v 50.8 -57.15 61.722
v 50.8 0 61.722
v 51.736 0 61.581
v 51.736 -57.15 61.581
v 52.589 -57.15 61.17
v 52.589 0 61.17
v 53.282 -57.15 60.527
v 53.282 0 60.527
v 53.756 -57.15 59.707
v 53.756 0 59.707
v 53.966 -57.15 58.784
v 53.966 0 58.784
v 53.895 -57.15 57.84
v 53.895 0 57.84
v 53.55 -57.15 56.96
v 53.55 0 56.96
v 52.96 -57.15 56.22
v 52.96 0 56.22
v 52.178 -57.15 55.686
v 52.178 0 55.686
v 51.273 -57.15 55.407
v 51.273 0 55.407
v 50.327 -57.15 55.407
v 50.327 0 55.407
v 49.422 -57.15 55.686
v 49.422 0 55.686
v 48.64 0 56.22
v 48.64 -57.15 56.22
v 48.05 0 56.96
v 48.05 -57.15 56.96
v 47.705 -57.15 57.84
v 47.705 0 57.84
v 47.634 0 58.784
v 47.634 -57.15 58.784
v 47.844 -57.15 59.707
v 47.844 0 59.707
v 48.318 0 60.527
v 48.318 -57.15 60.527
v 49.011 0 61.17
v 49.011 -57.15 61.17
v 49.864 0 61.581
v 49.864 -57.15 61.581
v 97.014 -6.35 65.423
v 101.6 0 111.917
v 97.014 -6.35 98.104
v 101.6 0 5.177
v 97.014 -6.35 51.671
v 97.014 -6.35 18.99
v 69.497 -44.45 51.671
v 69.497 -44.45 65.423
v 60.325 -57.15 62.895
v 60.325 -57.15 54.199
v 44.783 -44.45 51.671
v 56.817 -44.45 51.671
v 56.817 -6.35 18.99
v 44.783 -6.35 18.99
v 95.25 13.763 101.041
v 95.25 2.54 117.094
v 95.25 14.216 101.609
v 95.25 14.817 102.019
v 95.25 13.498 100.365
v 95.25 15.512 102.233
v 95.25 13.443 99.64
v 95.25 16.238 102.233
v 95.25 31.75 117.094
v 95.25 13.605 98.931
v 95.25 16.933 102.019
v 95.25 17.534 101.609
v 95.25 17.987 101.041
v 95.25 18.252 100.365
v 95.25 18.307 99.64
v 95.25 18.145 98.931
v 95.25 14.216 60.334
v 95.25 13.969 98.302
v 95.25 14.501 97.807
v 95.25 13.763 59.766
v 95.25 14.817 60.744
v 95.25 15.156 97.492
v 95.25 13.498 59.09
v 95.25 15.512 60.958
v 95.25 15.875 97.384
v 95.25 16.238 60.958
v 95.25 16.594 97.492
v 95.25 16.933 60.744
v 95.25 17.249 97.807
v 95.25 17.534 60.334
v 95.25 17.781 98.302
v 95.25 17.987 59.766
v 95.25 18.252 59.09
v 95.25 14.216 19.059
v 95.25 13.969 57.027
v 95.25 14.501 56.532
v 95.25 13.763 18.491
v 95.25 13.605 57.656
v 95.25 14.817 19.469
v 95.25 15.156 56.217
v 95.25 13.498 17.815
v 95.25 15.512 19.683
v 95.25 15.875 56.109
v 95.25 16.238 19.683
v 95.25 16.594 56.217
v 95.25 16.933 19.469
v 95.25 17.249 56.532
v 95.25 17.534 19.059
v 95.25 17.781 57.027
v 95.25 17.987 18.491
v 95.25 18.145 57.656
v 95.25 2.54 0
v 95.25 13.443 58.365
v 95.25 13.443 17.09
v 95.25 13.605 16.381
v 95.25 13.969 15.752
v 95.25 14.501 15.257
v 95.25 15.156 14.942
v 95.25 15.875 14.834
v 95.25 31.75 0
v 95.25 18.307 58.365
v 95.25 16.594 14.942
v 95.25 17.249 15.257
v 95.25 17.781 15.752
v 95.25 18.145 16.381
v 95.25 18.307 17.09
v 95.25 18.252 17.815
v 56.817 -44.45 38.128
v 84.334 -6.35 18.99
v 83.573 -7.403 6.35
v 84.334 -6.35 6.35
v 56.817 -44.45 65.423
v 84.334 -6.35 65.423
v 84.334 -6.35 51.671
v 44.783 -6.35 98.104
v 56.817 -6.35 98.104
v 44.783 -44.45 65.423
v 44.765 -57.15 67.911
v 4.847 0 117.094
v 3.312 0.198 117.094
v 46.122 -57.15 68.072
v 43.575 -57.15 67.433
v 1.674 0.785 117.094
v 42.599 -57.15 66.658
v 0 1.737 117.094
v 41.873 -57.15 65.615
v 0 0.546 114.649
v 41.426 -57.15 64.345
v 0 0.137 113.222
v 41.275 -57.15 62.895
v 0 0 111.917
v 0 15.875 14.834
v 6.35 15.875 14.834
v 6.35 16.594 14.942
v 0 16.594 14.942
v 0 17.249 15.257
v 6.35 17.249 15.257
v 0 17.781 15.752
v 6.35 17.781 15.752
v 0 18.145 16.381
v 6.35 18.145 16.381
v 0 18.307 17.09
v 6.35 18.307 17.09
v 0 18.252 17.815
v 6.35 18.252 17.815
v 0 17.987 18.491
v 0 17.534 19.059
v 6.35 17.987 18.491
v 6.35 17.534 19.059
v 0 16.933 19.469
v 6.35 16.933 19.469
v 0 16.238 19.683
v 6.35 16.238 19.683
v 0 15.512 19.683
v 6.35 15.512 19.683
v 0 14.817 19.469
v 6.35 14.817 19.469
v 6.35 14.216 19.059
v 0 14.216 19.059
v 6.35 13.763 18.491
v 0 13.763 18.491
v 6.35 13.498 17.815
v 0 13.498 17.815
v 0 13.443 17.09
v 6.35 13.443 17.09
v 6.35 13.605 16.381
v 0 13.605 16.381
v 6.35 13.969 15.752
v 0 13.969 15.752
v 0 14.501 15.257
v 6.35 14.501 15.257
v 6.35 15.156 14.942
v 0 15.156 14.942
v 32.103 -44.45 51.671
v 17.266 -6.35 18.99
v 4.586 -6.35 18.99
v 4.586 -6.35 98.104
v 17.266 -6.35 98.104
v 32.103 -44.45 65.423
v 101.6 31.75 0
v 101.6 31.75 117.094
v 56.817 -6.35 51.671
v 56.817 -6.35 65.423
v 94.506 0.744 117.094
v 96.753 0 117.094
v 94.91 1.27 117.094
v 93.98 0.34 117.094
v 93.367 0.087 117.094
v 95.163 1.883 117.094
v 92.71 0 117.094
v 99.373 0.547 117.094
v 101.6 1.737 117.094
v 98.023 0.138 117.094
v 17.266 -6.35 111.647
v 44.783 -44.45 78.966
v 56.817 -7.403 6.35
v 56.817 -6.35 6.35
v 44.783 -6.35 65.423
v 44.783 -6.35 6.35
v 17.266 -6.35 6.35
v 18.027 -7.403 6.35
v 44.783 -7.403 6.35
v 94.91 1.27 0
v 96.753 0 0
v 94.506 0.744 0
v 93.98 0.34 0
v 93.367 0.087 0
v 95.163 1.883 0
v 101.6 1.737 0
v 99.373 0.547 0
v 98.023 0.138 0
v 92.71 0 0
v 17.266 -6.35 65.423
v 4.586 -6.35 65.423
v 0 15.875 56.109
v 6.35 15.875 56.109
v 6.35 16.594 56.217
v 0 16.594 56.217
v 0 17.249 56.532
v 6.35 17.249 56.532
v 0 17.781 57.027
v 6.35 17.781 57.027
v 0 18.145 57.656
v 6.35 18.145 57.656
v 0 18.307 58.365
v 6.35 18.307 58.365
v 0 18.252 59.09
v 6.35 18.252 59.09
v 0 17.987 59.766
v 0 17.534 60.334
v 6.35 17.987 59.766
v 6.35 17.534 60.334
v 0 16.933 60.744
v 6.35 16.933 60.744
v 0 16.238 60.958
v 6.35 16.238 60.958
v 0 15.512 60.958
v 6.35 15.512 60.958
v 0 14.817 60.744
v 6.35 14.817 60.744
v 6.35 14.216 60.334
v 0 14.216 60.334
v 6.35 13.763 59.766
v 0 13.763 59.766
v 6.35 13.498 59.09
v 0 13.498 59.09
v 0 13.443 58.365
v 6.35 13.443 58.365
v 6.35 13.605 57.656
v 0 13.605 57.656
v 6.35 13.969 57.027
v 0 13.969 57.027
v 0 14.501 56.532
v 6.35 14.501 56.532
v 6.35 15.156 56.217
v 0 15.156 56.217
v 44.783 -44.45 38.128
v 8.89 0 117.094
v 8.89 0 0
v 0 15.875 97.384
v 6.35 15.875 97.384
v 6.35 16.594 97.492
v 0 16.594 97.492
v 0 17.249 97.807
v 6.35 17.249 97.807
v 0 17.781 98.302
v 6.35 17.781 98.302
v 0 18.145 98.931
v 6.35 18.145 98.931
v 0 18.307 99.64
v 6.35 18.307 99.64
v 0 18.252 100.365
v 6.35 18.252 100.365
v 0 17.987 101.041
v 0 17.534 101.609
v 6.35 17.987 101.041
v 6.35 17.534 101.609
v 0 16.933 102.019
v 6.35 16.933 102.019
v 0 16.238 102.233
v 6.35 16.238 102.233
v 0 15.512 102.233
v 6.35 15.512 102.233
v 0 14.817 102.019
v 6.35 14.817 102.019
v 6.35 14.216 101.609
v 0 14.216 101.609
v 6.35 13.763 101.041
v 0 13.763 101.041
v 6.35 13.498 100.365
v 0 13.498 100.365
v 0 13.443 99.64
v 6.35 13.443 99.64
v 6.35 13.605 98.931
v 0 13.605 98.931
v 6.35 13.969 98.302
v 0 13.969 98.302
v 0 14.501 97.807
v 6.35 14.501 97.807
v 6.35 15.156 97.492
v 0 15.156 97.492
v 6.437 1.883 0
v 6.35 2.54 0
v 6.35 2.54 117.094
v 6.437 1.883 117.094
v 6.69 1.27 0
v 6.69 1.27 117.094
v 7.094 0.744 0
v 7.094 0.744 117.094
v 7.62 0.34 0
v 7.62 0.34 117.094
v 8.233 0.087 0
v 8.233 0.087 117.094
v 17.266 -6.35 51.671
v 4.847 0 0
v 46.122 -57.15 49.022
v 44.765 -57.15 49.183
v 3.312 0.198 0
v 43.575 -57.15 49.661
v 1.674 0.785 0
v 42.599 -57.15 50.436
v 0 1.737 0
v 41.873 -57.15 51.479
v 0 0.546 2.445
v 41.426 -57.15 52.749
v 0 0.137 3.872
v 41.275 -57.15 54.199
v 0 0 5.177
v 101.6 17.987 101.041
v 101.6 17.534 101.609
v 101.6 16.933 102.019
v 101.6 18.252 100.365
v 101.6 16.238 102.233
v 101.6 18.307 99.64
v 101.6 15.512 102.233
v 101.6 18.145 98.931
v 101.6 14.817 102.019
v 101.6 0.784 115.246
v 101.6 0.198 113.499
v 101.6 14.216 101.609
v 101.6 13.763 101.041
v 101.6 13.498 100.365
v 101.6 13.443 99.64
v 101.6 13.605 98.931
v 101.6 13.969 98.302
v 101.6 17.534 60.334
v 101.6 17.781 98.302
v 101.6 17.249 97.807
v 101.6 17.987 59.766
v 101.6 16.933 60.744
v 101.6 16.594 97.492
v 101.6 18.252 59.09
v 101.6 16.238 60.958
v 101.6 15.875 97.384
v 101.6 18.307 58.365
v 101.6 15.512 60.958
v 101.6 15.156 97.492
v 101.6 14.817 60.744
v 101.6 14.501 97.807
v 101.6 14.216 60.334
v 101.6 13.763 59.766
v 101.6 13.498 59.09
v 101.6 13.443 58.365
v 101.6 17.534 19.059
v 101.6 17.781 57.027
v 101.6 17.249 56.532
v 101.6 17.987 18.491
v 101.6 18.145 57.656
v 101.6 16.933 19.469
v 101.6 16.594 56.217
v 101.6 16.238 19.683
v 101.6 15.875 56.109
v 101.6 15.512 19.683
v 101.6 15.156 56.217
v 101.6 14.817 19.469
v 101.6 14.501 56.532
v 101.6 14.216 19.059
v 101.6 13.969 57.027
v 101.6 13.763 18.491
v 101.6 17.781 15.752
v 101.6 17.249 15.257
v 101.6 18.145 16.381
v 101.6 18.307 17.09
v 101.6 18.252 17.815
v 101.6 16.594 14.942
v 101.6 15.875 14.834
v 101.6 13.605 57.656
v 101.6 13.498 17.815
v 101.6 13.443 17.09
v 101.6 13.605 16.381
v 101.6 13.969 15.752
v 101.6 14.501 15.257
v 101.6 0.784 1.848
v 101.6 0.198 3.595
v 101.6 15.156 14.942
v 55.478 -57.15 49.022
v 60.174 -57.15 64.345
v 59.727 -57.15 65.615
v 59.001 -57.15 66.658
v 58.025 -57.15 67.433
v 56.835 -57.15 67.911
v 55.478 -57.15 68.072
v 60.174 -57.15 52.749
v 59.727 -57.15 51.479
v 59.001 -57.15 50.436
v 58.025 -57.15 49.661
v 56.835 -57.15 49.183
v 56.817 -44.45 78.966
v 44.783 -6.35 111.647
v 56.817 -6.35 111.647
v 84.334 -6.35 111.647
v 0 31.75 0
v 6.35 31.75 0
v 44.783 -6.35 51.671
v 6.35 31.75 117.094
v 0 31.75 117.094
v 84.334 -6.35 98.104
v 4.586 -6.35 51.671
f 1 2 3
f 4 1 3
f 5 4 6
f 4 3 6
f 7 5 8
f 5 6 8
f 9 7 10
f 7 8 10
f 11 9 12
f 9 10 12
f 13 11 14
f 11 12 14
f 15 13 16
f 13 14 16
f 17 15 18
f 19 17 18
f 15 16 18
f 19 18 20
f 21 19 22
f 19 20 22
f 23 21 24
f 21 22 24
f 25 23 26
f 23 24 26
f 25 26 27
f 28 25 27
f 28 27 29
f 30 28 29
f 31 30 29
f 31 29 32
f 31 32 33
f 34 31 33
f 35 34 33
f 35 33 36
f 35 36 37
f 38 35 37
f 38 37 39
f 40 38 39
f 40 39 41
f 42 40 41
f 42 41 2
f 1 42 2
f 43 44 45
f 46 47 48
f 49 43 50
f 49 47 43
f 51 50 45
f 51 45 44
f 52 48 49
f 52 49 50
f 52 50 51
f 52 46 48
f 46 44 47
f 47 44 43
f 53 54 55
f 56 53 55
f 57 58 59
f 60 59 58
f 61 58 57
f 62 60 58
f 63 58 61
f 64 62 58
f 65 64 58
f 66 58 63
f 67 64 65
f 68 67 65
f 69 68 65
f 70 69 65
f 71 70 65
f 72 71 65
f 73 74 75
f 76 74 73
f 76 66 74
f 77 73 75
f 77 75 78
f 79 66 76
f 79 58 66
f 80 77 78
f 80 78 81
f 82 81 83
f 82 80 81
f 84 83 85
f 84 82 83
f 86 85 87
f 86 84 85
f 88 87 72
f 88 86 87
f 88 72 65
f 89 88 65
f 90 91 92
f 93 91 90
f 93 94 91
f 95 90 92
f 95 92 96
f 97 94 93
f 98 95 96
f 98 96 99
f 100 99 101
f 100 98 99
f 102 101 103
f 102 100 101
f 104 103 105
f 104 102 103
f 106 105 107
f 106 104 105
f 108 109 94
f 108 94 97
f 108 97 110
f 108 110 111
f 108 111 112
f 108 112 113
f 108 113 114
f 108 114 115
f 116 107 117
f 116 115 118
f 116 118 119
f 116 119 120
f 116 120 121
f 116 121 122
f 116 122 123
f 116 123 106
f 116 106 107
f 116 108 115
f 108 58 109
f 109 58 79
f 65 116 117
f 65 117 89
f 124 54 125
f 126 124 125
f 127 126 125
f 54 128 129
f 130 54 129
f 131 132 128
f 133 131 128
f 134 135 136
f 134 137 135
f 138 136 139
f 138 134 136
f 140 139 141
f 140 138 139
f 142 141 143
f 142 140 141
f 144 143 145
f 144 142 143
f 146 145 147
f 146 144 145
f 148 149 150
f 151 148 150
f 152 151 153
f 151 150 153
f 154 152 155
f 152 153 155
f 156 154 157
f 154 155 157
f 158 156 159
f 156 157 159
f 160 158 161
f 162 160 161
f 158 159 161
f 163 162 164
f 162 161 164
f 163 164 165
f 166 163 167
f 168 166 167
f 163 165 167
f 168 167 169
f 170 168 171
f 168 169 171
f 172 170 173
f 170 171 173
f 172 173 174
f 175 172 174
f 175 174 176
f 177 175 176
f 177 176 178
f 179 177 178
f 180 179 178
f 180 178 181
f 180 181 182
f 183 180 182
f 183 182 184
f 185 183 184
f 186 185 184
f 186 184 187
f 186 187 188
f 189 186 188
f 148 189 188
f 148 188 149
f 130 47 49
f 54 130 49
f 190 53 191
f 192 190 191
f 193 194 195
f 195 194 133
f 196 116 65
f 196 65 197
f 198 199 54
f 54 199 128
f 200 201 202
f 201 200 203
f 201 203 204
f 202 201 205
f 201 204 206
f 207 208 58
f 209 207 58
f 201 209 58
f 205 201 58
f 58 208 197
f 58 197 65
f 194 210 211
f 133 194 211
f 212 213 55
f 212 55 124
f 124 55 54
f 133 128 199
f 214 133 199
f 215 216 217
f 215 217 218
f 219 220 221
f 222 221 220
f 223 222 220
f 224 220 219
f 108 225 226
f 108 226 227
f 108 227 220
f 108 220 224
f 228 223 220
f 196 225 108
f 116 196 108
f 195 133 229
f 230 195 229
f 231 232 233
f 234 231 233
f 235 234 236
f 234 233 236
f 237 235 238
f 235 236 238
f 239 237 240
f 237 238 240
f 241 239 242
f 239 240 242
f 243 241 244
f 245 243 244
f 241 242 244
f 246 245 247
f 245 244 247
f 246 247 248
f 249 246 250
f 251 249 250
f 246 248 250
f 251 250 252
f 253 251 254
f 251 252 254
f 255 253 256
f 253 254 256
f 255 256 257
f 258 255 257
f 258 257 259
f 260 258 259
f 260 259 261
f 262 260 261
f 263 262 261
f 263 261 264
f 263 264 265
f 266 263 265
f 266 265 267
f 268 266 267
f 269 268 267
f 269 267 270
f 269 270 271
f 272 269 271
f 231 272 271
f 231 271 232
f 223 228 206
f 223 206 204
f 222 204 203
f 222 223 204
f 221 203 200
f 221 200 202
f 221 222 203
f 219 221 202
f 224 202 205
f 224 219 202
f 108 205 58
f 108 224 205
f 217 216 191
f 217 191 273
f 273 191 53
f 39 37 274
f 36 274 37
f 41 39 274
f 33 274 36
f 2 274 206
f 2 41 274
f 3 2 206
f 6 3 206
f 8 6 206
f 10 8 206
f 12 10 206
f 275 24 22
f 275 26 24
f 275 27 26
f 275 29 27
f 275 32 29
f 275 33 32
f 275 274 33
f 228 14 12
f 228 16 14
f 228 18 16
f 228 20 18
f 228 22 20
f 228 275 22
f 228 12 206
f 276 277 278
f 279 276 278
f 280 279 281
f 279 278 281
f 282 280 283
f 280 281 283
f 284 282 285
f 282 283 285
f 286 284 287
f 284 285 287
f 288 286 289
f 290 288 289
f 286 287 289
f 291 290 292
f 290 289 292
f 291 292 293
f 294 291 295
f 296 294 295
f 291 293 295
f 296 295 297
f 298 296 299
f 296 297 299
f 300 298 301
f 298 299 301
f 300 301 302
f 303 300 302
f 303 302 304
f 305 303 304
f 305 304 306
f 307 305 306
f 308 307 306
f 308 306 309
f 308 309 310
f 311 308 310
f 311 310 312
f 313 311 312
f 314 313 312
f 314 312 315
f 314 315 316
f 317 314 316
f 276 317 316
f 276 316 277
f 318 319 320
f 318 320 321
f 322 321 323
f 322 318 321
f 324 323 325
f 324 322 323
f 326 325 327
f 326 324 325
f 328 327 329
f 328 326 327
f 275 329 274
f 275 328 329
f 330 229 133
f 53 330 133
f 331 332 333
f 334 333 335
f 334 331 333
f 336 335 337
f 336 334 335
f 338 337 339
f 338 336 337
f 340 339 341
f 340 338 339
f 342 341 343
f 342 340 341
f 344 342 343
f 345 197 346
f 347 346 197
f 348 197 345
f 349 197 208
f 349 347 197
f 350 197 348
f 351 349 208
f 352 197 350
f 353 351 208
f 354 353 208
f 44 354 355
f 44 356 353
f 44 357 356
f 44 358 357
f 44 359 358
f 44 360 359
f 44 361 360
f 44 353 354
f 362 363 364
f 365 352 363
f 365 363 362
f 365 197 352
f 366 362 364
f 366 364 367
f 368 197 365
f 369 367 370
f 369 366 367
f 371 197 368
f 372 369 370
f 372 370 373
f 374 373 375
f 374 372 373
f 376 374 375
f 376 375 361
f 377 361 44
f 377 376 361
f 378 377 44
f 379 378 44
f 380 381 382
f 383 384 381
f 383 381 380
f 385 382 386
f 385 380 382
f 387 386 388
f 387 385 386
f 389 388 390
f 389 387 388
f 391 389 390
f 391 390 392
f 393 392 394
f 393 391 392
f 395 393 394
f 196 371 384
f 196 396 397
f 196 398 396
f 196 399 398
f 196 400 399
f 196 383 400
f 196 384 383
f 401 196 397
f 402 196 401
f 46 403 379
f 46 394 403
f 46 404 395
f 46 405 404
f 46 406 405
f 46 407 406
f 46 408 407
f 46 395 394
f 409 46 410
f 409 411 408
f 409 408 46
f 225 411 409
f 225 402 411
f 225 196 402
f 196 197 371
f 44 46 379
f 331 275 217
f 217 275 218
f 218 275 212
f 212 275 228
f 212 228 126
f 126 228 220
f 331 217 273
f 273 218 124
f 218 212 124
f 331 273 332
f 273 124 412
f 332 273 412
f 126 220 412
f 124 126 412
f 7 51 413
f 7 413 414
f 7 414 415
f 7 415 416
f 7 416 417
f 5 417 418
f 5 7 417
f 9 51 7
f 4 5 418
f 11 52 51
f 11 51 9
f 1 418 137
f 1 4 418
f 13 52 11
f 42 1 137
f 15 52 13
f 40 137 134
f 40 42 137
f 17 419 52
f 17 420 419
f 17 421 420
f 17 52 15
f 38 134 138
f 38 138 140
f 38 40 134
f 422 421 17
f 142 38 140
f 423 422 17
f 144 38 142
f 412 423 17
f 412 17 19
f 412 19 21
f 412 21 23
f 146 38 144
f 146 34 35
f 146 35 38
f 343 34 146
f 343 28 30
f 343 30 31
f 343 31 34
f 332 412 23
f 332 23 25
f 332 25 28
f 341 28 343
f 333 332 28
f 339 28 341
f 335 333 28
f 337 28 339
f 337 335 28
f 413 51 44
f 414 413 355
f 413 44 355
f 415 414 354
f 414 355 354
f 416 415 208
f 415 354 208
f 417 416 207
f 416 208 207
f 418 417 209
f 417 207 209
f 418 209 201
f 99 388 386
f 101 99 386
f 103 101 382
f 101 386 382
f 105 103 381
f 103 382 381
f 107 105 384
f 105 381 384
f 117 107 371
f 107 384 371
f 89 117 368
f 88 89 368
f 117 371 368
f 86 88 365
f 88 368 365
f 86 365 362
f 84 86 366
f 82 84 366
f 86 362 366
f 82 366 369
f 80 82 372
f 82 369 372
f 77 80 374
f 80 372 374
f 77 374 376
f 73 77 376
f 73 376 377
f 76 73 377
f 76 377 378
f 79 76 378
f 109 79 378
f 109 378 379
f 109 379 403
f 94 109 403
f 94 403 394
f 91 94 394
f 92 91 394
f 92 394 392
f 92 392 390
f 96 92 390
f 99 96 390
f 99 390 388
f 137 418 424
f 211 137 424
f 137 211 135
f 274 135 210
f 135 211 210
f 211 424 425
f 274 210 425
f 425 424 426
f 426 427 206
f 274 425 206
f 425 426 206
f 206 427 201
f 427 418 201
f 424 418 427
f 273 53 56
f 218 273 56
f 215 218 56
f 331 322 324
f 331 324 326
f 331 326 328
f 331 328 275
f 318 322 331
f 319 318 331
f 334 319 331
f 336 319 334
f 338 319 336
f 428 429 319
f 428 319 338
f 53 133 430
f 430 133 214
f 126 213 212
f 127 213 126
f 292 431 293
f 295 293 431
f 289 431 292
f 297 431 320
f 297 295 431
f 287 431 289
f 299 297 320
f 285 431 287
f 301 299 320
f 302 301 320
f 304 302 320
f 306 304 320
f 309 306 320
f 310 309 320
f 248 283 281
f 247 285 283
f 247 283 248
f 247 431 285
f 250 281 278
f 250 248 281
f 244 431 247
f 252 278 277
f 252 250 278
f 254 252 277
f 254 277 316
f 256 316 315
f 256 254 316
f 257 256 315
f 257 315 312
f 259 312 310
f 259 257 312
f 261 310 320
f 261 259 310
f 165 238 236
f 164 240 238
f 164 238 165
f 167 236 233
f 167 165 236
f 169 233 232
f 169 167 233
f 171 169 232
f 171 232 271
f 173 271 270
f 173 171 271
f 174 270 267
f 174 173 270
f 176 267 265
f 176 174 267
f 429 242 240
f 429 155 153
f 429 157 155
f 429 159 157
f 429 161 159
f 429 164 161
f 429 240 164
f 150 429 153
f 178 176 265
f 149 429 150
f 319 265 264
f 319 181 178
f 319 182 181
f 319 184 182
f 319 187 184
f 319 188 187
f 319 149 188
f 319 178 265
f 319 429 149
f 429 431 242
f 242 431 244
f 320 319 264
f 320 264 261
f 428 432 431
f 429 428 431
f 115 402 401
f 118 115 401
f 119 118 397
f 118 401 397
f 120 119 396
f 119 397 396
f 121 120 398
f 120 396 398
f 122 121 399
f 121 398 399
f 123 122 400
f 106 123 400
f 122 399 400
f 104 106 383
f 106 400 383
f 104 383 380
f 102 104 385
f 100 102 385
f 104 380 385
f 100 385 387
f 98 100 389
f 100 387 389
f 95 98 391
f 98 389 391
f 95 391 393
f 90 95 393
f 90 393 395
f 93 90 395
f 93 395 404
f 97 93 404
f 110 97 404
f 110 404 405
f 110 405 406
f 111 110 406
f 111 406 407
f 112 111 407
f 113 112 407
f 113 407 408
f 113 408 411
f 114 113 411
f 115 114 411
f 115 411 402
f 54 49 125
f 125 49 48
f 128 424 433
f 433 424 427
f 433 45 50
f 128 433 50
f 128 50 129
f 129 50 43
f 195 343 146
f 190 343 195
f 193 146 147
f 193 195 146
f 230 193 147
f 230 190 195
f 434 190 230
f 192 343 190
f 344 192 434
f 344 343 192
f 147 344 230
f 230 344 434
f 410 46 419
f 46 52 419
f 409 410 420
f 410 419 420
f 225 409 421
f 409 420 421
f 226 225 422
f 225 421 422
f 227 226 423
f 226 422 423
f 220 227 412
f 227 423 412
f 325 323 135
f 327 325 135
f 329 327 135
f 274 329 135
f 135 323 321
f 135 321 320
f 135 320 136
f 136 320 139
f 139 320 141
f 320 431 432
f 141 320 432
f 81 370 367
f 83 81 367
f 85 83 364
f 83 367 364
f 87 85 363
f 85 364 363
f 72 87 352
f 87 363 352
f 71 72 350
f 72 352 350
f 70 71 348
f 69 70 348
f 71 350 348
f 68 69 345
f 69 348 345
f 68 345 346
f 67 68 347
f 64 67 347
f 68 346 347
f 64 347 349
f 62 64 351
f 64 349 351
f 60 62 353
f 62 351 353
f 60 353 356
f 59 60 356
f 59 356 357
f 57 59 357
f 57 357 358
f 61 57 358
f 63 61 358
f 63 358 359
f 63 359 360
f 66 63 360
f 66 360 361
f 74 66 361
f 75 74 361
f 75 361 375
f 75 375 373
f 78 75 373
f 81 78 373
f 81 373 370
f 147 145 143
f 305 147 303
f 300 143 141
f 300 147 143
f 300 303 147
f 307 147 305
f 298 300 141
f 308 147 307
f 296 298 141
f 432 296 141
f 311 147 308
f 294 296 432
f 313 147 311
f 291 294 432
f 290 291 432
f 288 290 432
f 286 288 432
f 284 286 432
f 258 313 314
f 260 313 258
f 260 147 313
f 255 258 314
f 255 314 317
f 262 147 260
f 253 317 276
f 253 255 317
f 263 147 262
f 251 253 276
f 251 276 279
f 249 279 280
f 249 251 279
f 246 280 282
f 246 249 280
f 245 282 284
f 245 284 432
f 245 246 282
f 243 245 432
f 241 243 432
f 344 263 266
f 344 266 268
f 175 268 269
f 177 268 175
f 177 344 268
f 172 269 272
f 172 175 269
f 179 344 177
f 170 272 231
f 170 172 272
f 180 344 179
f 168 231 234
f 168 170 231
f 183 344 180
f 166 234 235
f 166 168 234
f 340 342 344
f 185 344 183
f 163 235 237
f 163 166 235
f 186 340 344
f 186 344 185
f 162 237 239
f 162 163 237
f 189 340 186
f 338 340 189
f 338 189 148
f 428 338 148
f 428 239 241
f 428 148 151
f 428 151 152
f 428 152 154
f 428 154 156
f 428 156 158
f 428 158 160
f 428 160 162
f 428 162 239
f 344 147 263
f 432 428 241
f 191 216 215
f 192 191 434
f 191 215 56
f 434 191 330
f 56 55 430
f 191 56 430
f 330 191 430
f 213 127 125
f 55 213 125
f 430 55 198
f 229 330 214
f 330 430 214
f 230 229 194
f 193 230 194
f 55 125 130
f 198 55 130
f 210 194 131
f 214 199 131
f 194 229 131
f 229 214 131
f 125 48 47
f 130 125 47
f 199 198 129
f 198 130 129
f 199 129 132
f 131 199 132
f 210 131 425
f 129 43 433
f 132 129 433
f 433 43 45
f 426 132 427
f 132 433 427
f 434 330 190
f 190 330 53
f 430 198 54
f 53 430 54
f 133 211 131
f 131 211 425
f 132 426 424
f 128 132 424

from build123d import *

# Parameters (mm, degrees)
BOSS_EXTRUDE1_DEPTH = 117.094
SKETCH3_R           = 2.4384
CUT_EXTRUDE1_DEPTH  = 166.226170252
SKETCH4_R           = 3.175
CUT_EXTRUDE2_DEPTH  = 166.226170252
CUT_EXTRUDE3_DEPTH  = 166.226170252
FILLET1_R           = 6.35
CUT_EXTRUDE4_DEPTH  = 166.226170252
CUT_EXTRUDE5_DEPTH  = 110.744


with BuildPart() as part:
    # Sketch2 → Boss-Extrude1 (new body)
    with BuildSketch(Plane.XY):
        with BuildLine():
            Line((95.25, 31.75), (101.6, 31.75))
            Line((101.6, 31.75), (101.6, 0))
            Line((101.6, 0), (60.325, -57.15))
            Line((60.325, -57.15), (41.275, -57.15))
            Line((41.275, -57.15), (0, 0))
            Line((0, 0), (0, 31.75))
            Line((0, 31.75), (6.35, 31.75))
            Line((6.35, 31.75), (6.35, 2.54))
            ThreePointArc((6.35, 2.54), (7.093948776, 0.743948776), (8.89, 0))
            Line((8.89, 0), (92.71, 0))
            ThreePointArc((92.71, 0), (94.506051224, 0.743948776), (95.25, 2.54))
            Line((95.25, 2.54), (95.25, 31.75))
        make_face()
    extrude(amount=BOSS_EXTRUDE1_DEPTH)

    # Sketch3 → Cut-Extrude1 (cut, through all)
    with BuildSketch(Plane(origin=(101.6, 0, 0), x_dir=(0, 0, -1), z_dir=(1, 0, 0))):
        with Locations((-99.822, 15.875)):
            Circle(SKETCH3_R)
        with Locations((-58.547, 15.875)):
            Circle(SKETCH3_R)
        with Locations((-17.272, 15.875)):
            Circle(SKETCH3_R)
    extrude(amount=-CUT_EXTRUDE1_DEPTH, mode=Mode.SUBTRACT)

    # Sketch4 → Cut-Extrude2 (cut, through all)
    with BuildSketch(Plane(origin=(0, 0, 0), x_dir=(1, 0, 0), z_dir=(0, 1, 0))):
        with Locations(Location((50.8, -58.547, 0), (0, 0, 270))):
            Circle(SKETCH4_R)
    extrude(amount=-CUT_EXTRUDE2_DEPTH, mode=Mode.SUBTRACT)

    # Sketch5 → Cut-Extrude3 (cut, through all)
    with BuildSketch(Plane(origin=(101.6, 0, 0), x_dir=(0, 0, -1), z_dir=(1, 0, 0))):
        Polygon((-117.094, 0), (-117.094, -57.15), (-68.072, -57.15), align=None)
        Polygon((-49.022, -57.15), (0, -57.15), (0, 0), align=None)
    extrude(amount=-CUT_EXTRUDE3_DEPTH, mode=Mode.SUBTRACT)

    # Fillet1
    fillet1_edges = [part.edges().sort_by_distance(p)[0] for p in [
        (80.9625, -28.575, 92.583),
        (20.6375, -28.575, 92.583),
        (80.9625, -28.575, 24.511),
        (20.6375, -28.575, 24.511),
    ]]
    fillet(fillet1_edges, radius=FILLET1_R)

    # Sketch7 → Cut-Extrude4 (cut, through all)
    with BuildSketch(Plane(origin=(101.6, 0, 0), x_dir=(0, 0, -1), z_dir=(1, 0, 0))):
        Polygon((-98.104076531, -6.35), (-65.422743198, -44.45), (-65.422743198, -6.35), align=None)
        Polygon((-18.989923469, -6.35), (-51.671256802, -6.35), (-51.671256802, -44.45), align=None)
    extrude(amount=-CUT_EXTRUDE4_DEPTH, mode=Mode.SUBTRACT)

    # Sketch8 → Cut-Extrude5 (cut)
    with BuildSketch(Plane.XY.offset(117.094)):
        Polygon((17.266111361, -6.35), (44.782778028, -44.45), (44.782778028, -6.35), align=None)
        Polygon((84.333888639, -6.35), (56.817221972, -6.35), (56.817221972, -44.45), align=None)
    extrude(amount=-CUT_EXTRUDE5_DEPTH, mode=Mode.SUBTRACT)


solid = part.part
